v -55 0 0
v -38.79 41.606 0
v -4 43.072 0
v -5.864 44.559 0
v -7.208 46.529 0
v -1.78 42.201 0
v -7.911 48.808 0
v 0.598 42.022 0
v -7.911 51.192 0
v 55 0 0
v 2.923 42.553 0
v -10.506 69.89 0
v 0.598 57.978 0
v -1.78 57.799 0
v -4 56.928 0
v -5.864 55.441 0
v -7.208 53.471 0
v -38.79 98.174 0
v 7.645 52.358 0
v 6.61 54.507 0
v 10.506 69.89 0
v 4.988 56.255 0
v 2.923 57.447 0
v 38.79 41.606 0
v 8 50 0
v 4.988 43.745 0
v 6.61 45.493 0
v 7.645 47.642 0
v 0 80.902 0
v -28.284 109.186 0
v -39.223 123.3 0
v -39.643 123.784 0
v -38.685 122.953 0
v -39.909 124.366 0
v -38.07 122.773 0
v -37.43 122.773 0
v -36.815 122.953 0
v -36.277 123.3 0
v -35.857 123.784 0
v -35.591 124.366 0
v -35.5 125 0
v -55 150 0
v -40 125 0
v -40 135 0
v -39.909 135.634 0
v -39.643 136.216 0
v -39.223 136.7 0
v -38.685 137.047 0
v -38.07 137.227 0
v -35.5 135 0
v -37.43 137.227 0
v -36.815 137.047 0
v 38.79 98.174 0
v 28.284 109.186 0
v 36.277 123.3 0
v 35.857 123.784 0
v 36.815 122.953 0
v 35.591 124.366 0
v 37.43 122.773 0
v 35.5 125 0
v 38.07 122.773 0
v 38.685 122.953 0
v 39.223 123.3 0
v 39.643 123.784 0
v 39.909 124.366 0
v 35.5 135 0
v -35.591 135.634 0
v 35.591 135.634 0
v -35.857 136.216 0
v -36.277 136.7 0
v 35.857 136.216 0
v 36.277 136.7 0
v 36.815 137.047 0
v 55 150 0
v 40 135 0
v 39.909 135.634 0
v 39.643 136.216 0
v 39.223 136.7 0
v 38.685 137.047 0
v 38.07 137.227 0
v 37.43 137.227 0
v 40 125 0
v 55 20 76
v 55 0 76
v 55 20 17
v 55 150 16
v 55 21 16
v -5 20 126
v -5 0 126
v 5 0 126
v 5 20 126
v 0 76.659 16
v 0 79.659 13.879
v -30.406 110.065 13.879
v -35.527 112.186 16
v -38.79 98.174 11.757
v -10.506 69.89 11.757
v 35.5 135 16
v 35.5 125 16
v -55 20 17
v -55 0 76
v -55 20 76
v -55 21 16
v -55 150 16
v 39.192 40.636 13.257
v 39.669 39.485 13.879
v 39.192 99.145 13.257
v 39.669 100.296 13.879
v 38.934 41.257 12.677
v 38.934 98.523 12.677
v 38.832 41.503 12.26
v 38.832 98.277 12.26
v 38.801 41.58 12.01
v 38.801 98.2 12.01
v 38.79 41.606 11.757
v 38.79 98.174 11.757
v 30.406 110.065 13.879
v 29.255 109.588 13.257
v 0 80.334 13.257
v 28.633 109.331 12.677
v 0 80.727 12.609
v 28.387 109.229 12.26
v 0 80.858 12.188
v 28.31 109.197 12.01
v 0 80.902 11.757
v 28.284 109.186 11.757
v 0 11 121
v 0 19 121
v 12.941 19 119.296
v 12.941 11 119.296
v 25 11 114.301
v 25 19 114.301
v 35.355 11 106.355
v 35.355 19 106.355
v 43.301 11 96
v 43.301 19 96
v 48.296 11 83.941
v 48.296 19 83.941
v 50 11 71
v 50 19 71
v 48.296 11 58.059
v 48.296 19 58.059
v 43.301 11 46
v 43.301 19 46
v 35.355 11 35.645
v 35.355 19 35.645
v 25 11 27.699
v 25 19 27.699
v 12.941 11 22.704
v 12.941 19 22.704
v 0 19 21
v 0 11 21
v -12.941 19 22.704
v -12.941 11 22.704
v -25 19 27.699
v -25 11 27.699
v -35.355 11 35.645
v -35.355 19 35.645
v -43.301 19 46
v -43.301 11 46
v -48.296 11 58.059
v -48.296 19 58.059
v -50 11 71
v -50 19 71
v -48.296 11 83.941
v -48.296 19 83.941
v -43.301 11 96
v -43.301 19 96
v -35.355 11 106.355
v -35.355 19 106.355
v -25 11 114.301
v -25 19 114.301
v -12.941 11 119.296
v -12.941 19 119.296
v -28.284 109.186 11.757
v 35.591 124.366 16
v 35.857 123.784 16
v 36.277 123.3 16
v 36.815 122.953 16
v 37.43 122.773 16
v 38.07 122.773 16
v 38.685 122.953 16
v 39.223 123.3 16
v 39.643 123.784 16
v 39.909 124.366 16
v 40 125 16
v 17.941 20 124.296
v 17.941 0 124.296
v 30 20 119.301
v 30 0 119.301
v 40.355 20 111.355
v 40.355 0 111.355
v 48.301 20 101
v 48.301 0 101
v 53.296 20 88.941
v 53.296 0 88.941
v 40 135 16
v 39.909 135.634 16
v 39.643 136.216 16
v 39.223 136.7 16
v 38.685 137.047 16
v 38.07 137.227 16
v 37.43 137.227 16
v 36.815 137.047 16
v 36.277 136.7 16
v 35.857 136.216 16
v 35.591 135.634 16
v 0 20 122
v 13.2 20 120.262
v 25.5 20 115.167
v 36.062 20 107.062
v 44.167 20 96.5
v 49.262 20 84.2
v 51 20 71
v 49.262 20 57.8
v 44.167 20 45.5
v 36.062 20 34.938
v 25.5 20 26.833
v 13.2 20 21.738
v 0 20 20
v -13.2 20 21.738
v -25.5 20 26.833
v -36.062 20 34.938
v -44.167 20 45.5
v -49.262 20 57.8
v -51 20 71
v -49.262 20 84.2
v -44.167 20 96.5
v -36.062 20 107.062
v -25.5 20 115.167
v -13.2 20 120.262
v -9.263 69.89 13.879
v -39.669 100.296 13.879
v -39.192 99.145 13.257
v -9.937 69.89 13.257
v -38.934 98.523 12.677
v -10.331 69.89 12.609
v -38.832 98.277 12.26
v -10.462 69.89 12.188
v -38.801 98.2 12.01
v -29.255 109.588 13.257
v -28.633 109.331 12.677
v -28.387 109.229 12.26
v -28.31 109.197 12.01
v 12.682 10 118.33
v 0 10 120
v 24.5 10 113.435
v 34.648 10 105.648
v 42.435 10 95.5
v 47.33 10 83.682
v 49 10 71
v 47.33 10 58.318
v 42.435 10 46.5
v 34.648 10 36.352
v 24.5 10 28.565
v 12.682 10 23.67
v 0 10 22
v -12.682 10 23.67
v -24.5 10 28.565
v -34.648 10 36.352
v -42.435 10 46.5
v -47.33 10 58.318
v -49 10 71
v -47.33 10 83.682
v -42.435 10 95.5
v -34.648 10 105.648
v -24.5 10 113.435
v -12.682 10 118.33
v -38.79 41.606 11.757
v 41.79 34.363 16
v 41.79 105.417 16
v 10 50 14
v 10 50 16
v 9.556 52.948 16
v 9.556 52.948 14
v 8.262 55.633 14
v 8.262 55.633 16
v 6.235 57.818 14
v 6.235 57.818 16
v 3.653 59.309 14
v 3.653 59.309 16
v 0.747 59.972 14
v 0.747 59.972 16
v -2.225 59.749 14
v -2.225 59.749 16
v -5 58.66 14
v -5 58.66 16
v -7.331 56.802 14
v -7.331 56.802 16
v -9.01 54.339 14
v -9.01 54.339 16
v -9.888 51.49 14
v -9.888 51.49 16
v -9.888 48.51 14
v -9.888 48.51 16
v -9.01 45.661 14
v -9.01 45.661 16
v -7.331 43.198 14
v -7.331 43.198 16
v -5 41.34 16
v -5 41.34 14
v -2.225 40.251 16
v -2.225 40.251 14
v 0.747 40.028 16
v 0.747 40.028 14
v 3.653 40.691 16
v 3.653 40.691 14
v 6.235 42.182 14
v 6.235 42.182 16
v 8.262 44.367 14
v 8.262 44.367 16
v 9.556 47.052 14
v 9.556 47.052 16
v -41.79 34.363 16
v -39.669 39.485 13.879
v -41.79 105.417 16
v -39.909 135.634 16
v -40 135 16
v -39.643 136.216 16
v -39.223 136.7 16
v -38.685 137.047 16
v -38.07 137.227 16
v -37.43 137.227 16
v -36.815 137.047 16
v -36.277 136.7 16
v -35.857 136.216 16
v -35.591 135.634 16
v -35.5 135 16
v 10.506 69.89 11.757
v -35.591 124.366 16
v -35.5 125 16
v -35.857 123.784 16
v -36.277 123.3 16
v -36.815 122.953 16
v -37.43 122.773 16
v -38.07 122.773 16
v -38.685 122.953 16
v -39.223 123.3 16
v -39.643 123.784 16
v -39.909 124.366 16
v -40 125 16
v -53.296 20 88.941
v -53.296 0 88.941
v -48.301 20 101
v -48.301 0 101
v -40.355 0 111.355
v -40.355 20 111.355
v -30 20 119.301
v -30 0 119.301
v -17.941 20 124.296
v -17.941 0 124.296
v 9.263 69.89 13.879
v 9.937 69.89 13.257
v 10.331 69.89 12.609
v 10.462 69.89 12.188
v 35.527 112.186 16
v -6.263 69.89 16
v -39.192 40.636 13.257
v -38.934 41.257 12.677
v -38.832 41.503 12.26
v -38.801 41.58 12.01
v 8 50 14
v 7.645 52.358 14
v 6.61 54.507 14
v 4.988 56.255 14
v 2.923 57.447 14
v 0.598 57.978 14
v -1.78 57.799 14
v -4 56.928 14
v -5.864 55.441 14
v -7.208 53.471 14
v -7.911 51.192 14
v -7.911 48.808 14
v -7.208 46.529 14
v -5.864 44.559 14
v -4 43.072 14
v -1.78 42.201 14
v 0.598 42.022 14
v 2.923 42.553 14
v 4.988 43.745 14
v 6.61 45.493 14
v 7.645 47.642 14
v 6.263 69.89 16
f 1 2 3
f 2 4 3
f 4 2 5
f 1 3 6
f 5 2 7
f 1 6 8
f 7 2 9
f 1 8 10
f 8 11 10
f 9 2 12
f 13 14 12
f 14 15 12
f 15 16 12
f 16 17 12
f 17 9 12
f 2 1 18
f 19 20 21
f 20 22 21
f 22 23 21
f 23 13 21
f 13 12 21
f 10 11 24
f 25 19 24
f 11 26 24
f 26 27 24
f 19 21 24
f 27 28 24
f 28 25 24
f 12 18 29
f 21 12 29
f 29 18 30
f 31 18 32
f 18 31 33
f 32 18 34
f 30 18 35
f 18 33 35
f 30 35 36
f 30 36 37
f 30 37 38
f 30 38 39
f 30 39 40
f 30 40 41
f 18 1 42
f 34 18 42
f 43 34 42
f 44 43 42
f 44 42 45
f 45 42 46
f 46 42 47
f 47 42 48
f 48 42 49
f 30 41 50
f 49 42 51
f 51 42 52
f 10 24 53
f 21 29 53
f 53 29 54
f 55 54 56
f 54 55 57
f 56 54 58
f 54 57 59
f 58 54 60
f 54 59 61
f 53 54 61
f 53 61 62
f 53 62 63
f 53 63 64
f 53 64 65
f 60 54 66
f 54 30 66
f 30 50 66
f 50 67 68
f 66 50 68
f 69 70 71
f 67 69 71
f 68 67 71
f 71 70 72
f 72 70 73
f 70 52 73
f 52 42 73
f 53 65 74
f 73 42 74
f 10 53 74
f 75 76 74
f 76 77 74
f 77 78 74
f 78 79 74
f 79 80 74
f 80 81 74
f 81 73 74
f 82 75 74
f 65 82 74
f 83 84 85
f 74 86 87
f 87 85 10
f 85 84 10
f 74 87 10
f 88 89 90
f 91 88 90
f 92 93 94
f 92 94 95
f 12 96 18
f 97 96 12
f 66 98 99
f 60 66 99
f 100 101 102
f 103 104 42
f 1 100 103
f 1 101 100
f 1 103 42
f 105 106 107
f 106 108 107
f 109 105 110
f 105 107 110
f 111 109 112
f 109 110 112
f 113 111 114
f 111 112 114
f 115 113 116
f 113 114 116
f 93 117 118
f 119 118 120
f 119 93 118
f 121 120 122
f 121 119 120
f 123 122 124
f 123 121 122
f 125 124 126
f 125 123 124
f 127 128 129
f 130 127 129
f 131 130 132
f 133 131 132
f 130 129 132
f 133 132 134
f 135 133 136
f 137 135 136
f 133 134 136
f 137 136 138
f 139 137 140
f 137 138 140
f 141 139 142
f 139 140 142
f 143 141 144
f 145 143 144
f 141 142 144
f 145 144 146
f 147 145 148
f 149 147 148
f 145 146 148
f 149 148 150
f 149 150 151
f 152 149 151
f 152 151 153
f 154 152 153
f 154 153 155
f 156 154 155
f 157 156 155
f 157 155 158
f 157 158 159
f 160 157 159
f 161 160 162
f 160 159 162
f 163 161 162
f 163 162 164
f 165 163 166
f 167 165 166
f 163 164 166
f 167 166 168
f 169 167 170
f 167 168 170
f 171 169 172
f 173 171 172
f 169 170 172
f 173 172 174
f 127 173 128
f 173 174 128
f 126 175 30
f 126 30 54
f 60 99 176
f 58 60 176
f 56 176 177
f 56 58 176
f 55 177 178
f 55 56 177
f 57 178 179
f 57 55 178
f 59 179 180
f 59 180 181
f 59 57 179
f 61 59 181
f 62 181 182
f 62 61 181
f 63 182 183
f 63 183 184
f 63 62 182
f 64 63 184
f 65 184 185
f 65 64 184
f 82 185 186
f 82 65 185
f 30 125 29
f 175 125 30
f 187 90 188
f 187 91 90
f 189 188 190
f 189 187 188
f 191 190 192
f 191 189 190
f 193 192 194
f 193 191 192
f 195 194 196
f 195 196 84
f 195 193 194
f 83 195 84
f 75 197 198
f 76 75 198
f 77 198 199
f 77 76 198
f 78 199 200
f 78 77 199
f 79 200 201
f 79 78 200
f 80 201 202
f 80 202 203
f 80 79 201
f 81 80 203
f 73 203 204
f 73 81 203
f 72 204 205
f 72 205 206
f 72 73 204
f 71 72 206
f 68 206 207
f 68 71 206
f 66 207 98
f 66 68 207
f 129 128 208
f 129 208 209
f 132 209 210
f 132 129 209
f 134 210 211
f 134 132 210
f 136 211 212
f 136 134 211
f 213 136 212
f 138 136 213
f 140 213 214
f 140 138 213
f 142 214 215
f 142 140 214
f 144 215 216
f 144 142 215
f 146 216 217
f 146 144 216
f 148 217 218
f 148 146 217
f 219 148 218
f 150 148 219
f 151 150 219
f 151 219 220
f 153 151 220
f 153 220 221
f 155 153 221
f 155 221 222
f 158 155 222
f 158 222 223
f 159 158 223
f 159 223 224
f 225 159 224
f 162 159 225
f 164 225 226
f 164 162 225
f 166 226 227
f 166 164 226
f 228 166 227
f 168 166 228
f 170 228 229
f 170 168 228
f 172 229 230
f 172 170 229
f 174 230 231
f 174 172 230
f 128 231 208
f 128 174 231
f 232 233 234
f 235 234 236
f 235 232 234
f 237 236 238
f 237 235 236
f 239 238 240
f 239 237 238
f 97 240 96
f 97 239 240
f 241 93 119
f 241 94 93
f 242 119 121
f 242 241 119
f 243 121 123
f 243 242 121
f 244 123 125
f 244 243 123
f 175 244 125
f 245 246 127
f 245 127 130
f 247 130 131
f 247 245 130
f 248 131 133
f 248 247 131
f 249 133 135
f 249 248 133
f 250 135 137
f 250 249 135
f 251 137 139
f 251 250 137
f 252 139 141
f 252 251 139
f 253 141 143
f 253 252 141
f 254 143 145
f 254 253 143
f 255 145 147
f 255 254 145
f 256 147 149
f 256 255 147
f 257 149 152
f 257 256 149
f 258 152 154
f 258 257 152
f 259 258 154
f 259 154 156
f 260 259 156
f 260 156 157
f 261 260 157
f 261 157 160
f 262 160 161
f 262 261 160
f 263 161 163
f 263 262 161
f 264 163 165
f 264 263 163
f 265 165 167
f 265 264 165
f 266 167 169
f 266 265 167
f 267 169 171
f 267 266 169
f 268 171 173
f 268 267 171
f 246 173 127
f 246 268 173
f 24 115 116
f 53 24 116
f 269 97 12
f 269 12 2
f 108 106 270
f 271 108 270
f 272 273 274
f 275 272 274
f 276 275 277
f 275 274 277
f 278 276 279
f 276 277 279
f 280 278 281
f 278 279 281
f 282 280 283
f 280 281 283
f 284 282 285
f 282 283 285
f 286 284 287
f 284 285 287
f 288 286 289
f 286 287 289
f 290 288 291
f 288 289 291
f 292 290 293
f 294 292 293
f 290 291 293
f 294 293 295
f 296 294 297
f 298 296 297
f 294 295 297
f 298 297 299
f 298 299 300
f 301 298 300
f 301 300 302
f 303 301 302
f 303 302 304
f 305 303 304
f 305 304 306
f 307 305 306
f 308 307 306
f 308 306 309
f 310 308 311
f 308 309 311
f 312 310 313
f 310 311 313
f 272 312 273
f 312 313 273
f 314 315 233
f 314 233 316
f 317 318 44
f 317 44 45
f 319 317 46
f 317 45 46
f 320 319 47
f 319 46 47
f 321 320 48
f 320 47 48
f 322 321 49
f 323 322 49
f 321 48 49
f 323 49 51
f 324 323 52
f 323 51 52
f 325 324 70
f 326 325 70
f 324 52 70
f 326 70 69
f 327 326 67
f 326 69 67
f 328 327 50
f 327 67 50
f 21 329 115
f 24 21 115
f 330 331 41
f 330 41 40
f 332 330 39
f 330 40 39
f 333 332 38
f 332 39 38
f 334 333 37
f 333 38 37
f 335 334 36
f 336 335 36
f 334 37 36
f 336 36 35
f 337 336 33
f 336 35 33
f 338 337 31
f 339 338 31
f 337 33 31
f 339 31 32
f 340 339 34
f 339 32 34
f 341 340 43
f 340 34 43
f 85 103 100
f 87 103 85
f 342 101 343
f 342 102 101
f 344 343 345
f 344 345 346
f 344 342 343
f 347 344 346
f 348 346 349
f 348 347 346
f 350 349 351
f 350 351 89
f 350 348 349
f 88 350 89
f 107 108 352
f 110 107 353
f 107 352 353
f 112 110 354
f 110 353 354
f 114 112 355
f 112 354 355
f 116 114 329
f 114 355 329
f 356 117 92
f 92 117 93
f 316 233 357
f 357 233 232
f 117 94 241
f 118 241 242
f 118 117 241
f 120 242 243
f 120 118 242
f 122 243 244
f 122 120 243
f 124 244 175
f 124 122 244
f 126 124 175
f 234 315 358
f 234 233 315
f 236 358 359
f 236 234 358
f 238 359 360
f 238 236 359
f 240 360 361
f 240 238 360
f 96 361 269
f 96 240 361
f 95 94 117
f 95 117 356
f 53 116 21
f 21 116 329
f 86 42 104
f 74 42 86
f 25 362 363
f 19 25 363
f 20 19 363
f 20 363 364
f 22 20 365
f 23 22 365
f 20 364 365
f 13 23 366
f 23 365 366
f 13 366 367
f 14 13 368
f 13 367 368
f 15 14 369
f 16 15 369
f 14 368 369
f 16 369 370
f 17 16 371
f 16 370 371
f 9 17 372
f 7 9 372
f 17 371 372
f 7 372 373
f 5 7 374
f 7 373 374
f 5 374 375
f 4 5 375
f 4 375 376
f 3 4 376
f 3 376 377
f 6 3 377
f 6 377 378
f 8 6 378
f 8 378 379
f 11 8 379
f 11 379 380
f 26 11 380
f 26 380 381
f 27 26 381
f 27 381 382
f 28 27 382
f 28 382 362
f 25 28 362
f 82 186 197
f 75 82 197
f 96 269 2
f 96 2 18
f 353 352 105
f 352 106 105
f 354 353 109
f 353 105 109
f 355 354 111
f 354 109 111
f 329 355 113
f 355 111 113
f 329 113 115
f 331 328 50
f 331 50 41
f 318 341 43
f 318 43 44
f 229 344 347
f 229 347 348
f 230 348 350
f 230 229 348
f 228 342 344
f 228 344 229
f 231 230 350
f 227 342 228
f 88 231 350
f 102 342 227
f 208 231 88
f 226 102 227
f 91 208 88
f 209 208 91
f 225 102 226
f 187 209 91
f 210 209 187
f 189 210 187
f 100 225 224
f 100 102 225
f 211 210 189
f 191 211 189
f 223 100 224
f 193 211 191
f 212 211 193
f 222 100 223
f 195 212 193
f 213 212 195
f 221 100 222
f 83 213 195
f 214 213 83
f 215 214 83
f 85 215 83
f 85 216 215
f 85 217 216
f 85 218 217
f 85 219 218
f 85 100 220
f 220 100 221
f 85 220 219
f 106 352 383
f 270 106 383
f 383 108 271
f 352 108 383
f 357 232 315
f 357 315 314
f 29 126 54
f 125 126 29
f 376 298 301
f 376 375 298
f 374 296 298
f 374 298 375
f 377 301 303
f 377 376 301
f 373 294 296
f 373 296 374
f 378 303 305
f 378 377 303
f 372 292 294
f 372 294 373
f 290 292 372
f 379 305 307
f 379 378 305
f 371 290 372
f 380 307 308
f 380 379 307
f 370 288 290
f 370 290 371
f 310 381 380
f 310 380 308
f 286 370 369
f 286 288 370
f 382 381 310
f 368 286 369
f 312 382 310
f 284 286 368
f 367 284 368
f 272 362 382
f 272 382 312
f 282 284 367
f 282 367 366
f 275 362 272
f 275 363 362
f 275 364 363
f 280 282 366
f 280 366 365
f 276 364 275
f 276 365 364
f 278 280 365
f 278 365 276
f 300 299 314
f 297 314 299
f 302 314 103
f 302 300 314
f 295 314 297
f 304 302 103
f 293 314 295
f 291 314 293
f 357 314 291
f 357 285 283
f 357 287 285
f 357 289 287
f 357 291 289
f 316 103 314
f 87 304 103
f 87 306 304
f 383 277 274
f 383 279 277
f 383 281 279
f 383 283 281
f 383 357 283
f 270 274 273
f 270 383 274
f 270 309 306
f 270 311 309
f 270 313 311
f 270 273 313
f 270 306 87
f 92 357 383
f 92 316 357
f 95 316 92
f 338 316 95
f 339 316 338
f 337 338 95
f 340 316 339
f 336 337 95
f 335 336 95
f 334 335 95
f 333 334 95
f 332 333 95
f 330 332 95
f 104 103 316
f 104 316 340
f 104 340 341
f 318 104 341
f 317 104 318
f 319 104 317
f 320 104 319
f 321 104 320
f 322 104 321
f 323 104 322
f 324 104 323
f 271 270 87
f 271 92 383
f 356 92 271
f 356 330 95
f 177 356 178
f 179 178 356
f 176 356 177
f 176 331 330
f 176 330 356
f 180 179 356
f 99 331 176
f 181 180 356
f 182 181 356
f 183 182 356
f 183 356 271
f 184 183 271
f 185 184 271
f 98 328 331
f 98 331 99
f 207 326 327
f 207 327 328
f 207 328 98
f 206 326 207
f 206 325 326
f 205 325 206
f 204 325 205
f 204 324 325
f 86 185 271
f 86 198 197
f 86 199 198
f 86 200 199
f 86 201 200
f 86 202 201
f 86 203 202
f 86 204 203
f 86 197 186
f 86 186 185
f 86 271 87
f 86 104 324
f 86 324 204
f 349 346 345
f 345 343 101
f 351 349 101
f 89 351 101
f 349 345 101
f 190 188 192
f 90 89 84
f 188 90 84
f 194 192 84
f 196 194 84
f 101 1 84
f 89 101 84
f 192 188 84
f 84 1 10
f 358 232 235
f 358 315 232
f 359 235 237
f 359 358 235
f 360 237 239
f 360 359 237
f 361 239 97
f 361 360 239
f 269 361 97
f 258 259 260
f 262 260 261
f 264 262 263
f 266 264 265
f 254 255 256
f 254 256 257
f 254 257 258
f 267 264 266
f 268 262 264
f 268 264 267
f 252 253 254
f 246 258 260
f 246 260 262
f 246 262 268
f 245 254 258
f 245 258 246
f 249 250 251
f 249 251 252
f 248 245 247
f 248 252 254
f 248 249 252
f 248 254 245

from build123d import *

# Parameters (mm, degrees)
SKETCH1_W           = 110
SKETCH1_H           = 150
BOSS_EXTRUDE1_DEPTH = 16
SKETCH4_W           = 110
SKETCH4_H           = 110
BOSS_EXTRUDE2_DEPTH = 20
SKETCH6_R           = 50
CUT_EXTRUDE1_DEPTH  = 10
FILLET1_R           = 50
SKETCH7_R           = 8
CUT_EXTRUDE4_DEPTH  = 194.971647413
SKETCH5_R           = 10
CUT_EXTRUDE5_DEPTH  = 2
CHAMFER3_SIZE       = 1
CHAMFER4_SIZE       = 1
CUT_EXTRUDE7_DEPTH  = 194.971647413
CHAMFER6_SIZE       = 3
FILLET3_R           = 3


with BuildPart() as part:
    # Sketch1 → Boss-Extrude1 (new body)
    with BuildSketch(Plane.XY):
        with Locations((0, 75)):
            Rectangle(SKETCH1_W, SKETCH1_H)
        with BuildLine():
            Line((-35.5, 135), (-35.5, 125))
            ThreePointArc((-35.5, 125), (-37.75, 122.75), (-40, 125))
            Line((-40, 125), (-40, 135))
            ThreePointArc((-40, 135), (-37.75, 137.25), (-35.5, 135))
        make_face(mode=Mode.SUBTRACT)
        with BuildLine():
            Line((35.5, 135), (35.5, 125))
            ThreePointArc((35.5, 125), (37.75, 122.75), (40, 125))
            Line((40, 125), (40, 135))
            ThreePointArc((40, 135), (37.75, 137.25), (35.5, 135))
        make_face(mode=Mode.SUBTRACT)
    extrude(amount=BOSS_EXTRUDE1_DEPTH)

    # Sketch4 → Boss-Extrude2 (add)
    with BuildSketch(Plane(origin=(0, 0, 0), x_dir=(1, 0, 0), z_dir=(0, 1, 0))):
        with Locations((0, -71)):
            Rectangle(SKETCH4_W, SKETCH4_H)
    extrude(amount=BOSS_EXTRUDE2_DEPTH)

    # Sketch6 → Cut-Extrude1 (cut)
    with BuildSketch(Plane(origin=(0, 20, 0), x_dir=(1, 0, 0), z_dir=(0, 1, 0))):
        with Locations(Location((0, -71, 0), (0, 0, 270))):
            Circle(SKETCH6_R)
    extrude(amount=-CUT_EXTRUDE1_DEPTH, mode=Mode.SUBTRACT)

    # Fillet1
    fillet1_edges = [part.edges().sort_by_distance(p)[0] for p in [
        (-55, 10, 126),
        (55, 10, 126),
    ]]
    fillet(fillet1_edges, radius=FILLET1_R)

    # Sketch7 → Cut-Extrude4 (cut, through all)
    with BuildSketch(Plane.XY.offset(16)):
        with Locations((0, 50)):
            Circle(SKETCH7_R)
    extrude(amount=-CUT_EXTRUDE4_DEPTH, mode=Mode.SUBTRACT)

    # Sketch5 → Cut-Extrude5 (cut)
    with BuildSketch(Plane.XY.offset(16)):
        with Locations((0, 50)):
            Circle(SKETCH5_R)
    extrude(amount=-CUT_EXTRUDE5_DEPTH, mode=Mode.SUBTRACT)

    # Chamfer3
    chamfer3_edges = [part.edges().sort_by_distance(p)[0] for p in [
        (0, 20, 16),
    ]]
    chamfer(chamfer3_edges, length=CHAMFER3_SIZE)

    # Chamfer4
    chamfer4_edges = [part.edges().sort_by_distance(p)[0] for p in [
        (0, 10, 21),
        (0, 20, 21),
    ]]
    chamfer(chamfer4_edges, length=CHAMFER4_SIZE)

    # Sketch8 → Cut-Extrude7 (cut, through all)
    with BuildSketch(Plane.XY.offset(16)):
        Polygon((-38.790019507, 98.174483069), (-10.505748259, 69.890211821), (-38.790019507, 41.605940574), align=None)
        Polygon((10.505748259, 69.890211821), (38.790019507, 41.605940574), (38.790019507, 98.174483069), align=None)
        Polygon((28.284271247, 109.186355869), (0, 80.902084621), (-28.284271247, 109.186355869), align=None)
    extrude(amount=-CUT_EXTRUDE7_DEPTH, mode=Mode.SUBTRACT)

    # Chamfer6
    chamfer6_edges = [part.edges().sort_by_distance(p)[0] for p in [
        (24.647883883, 84.032347445, 16),
        (24.647883883, 55.748076198, 16),
        (38.790019507, 69.890211821, 16),
        (0, 109.186355869, 16),
        (-14.142135624, 95.044220245, 16),
        (14.142135624, 95.044220245, 16),
        (-38.790019507, 69.890211821, 16),
        (-24.647883883, 55.748076198, 16),
        (-24.647883883, 84.032347445, 16),
    ]]
    chamfer(chamfer6_edges, length=CHAMFER6_SIZE)

    # Fillet3
    fillet3_edges = [part.edges().sort_by_distance(p)[0] for p in [
        (24.647883883, 55.748076198, 13),
        (38.790019507, 69.890211821, 13),
        (24.647883883, 84.032347445, 13),
        (-24.647883883, 55.748076198, 13),
        (-24.647883883, 84.032347445, 13),
        (-38.790019507, 69.890211821, 13),
        (-14.142135624, 95.044220245, 13),
        (14.142135624, 95.044220245, 13),
        (0, 109.186355869, 13),
    ]]
    fillet(fillet3_edges, radius=FILLET3_R)


solid = part.part
